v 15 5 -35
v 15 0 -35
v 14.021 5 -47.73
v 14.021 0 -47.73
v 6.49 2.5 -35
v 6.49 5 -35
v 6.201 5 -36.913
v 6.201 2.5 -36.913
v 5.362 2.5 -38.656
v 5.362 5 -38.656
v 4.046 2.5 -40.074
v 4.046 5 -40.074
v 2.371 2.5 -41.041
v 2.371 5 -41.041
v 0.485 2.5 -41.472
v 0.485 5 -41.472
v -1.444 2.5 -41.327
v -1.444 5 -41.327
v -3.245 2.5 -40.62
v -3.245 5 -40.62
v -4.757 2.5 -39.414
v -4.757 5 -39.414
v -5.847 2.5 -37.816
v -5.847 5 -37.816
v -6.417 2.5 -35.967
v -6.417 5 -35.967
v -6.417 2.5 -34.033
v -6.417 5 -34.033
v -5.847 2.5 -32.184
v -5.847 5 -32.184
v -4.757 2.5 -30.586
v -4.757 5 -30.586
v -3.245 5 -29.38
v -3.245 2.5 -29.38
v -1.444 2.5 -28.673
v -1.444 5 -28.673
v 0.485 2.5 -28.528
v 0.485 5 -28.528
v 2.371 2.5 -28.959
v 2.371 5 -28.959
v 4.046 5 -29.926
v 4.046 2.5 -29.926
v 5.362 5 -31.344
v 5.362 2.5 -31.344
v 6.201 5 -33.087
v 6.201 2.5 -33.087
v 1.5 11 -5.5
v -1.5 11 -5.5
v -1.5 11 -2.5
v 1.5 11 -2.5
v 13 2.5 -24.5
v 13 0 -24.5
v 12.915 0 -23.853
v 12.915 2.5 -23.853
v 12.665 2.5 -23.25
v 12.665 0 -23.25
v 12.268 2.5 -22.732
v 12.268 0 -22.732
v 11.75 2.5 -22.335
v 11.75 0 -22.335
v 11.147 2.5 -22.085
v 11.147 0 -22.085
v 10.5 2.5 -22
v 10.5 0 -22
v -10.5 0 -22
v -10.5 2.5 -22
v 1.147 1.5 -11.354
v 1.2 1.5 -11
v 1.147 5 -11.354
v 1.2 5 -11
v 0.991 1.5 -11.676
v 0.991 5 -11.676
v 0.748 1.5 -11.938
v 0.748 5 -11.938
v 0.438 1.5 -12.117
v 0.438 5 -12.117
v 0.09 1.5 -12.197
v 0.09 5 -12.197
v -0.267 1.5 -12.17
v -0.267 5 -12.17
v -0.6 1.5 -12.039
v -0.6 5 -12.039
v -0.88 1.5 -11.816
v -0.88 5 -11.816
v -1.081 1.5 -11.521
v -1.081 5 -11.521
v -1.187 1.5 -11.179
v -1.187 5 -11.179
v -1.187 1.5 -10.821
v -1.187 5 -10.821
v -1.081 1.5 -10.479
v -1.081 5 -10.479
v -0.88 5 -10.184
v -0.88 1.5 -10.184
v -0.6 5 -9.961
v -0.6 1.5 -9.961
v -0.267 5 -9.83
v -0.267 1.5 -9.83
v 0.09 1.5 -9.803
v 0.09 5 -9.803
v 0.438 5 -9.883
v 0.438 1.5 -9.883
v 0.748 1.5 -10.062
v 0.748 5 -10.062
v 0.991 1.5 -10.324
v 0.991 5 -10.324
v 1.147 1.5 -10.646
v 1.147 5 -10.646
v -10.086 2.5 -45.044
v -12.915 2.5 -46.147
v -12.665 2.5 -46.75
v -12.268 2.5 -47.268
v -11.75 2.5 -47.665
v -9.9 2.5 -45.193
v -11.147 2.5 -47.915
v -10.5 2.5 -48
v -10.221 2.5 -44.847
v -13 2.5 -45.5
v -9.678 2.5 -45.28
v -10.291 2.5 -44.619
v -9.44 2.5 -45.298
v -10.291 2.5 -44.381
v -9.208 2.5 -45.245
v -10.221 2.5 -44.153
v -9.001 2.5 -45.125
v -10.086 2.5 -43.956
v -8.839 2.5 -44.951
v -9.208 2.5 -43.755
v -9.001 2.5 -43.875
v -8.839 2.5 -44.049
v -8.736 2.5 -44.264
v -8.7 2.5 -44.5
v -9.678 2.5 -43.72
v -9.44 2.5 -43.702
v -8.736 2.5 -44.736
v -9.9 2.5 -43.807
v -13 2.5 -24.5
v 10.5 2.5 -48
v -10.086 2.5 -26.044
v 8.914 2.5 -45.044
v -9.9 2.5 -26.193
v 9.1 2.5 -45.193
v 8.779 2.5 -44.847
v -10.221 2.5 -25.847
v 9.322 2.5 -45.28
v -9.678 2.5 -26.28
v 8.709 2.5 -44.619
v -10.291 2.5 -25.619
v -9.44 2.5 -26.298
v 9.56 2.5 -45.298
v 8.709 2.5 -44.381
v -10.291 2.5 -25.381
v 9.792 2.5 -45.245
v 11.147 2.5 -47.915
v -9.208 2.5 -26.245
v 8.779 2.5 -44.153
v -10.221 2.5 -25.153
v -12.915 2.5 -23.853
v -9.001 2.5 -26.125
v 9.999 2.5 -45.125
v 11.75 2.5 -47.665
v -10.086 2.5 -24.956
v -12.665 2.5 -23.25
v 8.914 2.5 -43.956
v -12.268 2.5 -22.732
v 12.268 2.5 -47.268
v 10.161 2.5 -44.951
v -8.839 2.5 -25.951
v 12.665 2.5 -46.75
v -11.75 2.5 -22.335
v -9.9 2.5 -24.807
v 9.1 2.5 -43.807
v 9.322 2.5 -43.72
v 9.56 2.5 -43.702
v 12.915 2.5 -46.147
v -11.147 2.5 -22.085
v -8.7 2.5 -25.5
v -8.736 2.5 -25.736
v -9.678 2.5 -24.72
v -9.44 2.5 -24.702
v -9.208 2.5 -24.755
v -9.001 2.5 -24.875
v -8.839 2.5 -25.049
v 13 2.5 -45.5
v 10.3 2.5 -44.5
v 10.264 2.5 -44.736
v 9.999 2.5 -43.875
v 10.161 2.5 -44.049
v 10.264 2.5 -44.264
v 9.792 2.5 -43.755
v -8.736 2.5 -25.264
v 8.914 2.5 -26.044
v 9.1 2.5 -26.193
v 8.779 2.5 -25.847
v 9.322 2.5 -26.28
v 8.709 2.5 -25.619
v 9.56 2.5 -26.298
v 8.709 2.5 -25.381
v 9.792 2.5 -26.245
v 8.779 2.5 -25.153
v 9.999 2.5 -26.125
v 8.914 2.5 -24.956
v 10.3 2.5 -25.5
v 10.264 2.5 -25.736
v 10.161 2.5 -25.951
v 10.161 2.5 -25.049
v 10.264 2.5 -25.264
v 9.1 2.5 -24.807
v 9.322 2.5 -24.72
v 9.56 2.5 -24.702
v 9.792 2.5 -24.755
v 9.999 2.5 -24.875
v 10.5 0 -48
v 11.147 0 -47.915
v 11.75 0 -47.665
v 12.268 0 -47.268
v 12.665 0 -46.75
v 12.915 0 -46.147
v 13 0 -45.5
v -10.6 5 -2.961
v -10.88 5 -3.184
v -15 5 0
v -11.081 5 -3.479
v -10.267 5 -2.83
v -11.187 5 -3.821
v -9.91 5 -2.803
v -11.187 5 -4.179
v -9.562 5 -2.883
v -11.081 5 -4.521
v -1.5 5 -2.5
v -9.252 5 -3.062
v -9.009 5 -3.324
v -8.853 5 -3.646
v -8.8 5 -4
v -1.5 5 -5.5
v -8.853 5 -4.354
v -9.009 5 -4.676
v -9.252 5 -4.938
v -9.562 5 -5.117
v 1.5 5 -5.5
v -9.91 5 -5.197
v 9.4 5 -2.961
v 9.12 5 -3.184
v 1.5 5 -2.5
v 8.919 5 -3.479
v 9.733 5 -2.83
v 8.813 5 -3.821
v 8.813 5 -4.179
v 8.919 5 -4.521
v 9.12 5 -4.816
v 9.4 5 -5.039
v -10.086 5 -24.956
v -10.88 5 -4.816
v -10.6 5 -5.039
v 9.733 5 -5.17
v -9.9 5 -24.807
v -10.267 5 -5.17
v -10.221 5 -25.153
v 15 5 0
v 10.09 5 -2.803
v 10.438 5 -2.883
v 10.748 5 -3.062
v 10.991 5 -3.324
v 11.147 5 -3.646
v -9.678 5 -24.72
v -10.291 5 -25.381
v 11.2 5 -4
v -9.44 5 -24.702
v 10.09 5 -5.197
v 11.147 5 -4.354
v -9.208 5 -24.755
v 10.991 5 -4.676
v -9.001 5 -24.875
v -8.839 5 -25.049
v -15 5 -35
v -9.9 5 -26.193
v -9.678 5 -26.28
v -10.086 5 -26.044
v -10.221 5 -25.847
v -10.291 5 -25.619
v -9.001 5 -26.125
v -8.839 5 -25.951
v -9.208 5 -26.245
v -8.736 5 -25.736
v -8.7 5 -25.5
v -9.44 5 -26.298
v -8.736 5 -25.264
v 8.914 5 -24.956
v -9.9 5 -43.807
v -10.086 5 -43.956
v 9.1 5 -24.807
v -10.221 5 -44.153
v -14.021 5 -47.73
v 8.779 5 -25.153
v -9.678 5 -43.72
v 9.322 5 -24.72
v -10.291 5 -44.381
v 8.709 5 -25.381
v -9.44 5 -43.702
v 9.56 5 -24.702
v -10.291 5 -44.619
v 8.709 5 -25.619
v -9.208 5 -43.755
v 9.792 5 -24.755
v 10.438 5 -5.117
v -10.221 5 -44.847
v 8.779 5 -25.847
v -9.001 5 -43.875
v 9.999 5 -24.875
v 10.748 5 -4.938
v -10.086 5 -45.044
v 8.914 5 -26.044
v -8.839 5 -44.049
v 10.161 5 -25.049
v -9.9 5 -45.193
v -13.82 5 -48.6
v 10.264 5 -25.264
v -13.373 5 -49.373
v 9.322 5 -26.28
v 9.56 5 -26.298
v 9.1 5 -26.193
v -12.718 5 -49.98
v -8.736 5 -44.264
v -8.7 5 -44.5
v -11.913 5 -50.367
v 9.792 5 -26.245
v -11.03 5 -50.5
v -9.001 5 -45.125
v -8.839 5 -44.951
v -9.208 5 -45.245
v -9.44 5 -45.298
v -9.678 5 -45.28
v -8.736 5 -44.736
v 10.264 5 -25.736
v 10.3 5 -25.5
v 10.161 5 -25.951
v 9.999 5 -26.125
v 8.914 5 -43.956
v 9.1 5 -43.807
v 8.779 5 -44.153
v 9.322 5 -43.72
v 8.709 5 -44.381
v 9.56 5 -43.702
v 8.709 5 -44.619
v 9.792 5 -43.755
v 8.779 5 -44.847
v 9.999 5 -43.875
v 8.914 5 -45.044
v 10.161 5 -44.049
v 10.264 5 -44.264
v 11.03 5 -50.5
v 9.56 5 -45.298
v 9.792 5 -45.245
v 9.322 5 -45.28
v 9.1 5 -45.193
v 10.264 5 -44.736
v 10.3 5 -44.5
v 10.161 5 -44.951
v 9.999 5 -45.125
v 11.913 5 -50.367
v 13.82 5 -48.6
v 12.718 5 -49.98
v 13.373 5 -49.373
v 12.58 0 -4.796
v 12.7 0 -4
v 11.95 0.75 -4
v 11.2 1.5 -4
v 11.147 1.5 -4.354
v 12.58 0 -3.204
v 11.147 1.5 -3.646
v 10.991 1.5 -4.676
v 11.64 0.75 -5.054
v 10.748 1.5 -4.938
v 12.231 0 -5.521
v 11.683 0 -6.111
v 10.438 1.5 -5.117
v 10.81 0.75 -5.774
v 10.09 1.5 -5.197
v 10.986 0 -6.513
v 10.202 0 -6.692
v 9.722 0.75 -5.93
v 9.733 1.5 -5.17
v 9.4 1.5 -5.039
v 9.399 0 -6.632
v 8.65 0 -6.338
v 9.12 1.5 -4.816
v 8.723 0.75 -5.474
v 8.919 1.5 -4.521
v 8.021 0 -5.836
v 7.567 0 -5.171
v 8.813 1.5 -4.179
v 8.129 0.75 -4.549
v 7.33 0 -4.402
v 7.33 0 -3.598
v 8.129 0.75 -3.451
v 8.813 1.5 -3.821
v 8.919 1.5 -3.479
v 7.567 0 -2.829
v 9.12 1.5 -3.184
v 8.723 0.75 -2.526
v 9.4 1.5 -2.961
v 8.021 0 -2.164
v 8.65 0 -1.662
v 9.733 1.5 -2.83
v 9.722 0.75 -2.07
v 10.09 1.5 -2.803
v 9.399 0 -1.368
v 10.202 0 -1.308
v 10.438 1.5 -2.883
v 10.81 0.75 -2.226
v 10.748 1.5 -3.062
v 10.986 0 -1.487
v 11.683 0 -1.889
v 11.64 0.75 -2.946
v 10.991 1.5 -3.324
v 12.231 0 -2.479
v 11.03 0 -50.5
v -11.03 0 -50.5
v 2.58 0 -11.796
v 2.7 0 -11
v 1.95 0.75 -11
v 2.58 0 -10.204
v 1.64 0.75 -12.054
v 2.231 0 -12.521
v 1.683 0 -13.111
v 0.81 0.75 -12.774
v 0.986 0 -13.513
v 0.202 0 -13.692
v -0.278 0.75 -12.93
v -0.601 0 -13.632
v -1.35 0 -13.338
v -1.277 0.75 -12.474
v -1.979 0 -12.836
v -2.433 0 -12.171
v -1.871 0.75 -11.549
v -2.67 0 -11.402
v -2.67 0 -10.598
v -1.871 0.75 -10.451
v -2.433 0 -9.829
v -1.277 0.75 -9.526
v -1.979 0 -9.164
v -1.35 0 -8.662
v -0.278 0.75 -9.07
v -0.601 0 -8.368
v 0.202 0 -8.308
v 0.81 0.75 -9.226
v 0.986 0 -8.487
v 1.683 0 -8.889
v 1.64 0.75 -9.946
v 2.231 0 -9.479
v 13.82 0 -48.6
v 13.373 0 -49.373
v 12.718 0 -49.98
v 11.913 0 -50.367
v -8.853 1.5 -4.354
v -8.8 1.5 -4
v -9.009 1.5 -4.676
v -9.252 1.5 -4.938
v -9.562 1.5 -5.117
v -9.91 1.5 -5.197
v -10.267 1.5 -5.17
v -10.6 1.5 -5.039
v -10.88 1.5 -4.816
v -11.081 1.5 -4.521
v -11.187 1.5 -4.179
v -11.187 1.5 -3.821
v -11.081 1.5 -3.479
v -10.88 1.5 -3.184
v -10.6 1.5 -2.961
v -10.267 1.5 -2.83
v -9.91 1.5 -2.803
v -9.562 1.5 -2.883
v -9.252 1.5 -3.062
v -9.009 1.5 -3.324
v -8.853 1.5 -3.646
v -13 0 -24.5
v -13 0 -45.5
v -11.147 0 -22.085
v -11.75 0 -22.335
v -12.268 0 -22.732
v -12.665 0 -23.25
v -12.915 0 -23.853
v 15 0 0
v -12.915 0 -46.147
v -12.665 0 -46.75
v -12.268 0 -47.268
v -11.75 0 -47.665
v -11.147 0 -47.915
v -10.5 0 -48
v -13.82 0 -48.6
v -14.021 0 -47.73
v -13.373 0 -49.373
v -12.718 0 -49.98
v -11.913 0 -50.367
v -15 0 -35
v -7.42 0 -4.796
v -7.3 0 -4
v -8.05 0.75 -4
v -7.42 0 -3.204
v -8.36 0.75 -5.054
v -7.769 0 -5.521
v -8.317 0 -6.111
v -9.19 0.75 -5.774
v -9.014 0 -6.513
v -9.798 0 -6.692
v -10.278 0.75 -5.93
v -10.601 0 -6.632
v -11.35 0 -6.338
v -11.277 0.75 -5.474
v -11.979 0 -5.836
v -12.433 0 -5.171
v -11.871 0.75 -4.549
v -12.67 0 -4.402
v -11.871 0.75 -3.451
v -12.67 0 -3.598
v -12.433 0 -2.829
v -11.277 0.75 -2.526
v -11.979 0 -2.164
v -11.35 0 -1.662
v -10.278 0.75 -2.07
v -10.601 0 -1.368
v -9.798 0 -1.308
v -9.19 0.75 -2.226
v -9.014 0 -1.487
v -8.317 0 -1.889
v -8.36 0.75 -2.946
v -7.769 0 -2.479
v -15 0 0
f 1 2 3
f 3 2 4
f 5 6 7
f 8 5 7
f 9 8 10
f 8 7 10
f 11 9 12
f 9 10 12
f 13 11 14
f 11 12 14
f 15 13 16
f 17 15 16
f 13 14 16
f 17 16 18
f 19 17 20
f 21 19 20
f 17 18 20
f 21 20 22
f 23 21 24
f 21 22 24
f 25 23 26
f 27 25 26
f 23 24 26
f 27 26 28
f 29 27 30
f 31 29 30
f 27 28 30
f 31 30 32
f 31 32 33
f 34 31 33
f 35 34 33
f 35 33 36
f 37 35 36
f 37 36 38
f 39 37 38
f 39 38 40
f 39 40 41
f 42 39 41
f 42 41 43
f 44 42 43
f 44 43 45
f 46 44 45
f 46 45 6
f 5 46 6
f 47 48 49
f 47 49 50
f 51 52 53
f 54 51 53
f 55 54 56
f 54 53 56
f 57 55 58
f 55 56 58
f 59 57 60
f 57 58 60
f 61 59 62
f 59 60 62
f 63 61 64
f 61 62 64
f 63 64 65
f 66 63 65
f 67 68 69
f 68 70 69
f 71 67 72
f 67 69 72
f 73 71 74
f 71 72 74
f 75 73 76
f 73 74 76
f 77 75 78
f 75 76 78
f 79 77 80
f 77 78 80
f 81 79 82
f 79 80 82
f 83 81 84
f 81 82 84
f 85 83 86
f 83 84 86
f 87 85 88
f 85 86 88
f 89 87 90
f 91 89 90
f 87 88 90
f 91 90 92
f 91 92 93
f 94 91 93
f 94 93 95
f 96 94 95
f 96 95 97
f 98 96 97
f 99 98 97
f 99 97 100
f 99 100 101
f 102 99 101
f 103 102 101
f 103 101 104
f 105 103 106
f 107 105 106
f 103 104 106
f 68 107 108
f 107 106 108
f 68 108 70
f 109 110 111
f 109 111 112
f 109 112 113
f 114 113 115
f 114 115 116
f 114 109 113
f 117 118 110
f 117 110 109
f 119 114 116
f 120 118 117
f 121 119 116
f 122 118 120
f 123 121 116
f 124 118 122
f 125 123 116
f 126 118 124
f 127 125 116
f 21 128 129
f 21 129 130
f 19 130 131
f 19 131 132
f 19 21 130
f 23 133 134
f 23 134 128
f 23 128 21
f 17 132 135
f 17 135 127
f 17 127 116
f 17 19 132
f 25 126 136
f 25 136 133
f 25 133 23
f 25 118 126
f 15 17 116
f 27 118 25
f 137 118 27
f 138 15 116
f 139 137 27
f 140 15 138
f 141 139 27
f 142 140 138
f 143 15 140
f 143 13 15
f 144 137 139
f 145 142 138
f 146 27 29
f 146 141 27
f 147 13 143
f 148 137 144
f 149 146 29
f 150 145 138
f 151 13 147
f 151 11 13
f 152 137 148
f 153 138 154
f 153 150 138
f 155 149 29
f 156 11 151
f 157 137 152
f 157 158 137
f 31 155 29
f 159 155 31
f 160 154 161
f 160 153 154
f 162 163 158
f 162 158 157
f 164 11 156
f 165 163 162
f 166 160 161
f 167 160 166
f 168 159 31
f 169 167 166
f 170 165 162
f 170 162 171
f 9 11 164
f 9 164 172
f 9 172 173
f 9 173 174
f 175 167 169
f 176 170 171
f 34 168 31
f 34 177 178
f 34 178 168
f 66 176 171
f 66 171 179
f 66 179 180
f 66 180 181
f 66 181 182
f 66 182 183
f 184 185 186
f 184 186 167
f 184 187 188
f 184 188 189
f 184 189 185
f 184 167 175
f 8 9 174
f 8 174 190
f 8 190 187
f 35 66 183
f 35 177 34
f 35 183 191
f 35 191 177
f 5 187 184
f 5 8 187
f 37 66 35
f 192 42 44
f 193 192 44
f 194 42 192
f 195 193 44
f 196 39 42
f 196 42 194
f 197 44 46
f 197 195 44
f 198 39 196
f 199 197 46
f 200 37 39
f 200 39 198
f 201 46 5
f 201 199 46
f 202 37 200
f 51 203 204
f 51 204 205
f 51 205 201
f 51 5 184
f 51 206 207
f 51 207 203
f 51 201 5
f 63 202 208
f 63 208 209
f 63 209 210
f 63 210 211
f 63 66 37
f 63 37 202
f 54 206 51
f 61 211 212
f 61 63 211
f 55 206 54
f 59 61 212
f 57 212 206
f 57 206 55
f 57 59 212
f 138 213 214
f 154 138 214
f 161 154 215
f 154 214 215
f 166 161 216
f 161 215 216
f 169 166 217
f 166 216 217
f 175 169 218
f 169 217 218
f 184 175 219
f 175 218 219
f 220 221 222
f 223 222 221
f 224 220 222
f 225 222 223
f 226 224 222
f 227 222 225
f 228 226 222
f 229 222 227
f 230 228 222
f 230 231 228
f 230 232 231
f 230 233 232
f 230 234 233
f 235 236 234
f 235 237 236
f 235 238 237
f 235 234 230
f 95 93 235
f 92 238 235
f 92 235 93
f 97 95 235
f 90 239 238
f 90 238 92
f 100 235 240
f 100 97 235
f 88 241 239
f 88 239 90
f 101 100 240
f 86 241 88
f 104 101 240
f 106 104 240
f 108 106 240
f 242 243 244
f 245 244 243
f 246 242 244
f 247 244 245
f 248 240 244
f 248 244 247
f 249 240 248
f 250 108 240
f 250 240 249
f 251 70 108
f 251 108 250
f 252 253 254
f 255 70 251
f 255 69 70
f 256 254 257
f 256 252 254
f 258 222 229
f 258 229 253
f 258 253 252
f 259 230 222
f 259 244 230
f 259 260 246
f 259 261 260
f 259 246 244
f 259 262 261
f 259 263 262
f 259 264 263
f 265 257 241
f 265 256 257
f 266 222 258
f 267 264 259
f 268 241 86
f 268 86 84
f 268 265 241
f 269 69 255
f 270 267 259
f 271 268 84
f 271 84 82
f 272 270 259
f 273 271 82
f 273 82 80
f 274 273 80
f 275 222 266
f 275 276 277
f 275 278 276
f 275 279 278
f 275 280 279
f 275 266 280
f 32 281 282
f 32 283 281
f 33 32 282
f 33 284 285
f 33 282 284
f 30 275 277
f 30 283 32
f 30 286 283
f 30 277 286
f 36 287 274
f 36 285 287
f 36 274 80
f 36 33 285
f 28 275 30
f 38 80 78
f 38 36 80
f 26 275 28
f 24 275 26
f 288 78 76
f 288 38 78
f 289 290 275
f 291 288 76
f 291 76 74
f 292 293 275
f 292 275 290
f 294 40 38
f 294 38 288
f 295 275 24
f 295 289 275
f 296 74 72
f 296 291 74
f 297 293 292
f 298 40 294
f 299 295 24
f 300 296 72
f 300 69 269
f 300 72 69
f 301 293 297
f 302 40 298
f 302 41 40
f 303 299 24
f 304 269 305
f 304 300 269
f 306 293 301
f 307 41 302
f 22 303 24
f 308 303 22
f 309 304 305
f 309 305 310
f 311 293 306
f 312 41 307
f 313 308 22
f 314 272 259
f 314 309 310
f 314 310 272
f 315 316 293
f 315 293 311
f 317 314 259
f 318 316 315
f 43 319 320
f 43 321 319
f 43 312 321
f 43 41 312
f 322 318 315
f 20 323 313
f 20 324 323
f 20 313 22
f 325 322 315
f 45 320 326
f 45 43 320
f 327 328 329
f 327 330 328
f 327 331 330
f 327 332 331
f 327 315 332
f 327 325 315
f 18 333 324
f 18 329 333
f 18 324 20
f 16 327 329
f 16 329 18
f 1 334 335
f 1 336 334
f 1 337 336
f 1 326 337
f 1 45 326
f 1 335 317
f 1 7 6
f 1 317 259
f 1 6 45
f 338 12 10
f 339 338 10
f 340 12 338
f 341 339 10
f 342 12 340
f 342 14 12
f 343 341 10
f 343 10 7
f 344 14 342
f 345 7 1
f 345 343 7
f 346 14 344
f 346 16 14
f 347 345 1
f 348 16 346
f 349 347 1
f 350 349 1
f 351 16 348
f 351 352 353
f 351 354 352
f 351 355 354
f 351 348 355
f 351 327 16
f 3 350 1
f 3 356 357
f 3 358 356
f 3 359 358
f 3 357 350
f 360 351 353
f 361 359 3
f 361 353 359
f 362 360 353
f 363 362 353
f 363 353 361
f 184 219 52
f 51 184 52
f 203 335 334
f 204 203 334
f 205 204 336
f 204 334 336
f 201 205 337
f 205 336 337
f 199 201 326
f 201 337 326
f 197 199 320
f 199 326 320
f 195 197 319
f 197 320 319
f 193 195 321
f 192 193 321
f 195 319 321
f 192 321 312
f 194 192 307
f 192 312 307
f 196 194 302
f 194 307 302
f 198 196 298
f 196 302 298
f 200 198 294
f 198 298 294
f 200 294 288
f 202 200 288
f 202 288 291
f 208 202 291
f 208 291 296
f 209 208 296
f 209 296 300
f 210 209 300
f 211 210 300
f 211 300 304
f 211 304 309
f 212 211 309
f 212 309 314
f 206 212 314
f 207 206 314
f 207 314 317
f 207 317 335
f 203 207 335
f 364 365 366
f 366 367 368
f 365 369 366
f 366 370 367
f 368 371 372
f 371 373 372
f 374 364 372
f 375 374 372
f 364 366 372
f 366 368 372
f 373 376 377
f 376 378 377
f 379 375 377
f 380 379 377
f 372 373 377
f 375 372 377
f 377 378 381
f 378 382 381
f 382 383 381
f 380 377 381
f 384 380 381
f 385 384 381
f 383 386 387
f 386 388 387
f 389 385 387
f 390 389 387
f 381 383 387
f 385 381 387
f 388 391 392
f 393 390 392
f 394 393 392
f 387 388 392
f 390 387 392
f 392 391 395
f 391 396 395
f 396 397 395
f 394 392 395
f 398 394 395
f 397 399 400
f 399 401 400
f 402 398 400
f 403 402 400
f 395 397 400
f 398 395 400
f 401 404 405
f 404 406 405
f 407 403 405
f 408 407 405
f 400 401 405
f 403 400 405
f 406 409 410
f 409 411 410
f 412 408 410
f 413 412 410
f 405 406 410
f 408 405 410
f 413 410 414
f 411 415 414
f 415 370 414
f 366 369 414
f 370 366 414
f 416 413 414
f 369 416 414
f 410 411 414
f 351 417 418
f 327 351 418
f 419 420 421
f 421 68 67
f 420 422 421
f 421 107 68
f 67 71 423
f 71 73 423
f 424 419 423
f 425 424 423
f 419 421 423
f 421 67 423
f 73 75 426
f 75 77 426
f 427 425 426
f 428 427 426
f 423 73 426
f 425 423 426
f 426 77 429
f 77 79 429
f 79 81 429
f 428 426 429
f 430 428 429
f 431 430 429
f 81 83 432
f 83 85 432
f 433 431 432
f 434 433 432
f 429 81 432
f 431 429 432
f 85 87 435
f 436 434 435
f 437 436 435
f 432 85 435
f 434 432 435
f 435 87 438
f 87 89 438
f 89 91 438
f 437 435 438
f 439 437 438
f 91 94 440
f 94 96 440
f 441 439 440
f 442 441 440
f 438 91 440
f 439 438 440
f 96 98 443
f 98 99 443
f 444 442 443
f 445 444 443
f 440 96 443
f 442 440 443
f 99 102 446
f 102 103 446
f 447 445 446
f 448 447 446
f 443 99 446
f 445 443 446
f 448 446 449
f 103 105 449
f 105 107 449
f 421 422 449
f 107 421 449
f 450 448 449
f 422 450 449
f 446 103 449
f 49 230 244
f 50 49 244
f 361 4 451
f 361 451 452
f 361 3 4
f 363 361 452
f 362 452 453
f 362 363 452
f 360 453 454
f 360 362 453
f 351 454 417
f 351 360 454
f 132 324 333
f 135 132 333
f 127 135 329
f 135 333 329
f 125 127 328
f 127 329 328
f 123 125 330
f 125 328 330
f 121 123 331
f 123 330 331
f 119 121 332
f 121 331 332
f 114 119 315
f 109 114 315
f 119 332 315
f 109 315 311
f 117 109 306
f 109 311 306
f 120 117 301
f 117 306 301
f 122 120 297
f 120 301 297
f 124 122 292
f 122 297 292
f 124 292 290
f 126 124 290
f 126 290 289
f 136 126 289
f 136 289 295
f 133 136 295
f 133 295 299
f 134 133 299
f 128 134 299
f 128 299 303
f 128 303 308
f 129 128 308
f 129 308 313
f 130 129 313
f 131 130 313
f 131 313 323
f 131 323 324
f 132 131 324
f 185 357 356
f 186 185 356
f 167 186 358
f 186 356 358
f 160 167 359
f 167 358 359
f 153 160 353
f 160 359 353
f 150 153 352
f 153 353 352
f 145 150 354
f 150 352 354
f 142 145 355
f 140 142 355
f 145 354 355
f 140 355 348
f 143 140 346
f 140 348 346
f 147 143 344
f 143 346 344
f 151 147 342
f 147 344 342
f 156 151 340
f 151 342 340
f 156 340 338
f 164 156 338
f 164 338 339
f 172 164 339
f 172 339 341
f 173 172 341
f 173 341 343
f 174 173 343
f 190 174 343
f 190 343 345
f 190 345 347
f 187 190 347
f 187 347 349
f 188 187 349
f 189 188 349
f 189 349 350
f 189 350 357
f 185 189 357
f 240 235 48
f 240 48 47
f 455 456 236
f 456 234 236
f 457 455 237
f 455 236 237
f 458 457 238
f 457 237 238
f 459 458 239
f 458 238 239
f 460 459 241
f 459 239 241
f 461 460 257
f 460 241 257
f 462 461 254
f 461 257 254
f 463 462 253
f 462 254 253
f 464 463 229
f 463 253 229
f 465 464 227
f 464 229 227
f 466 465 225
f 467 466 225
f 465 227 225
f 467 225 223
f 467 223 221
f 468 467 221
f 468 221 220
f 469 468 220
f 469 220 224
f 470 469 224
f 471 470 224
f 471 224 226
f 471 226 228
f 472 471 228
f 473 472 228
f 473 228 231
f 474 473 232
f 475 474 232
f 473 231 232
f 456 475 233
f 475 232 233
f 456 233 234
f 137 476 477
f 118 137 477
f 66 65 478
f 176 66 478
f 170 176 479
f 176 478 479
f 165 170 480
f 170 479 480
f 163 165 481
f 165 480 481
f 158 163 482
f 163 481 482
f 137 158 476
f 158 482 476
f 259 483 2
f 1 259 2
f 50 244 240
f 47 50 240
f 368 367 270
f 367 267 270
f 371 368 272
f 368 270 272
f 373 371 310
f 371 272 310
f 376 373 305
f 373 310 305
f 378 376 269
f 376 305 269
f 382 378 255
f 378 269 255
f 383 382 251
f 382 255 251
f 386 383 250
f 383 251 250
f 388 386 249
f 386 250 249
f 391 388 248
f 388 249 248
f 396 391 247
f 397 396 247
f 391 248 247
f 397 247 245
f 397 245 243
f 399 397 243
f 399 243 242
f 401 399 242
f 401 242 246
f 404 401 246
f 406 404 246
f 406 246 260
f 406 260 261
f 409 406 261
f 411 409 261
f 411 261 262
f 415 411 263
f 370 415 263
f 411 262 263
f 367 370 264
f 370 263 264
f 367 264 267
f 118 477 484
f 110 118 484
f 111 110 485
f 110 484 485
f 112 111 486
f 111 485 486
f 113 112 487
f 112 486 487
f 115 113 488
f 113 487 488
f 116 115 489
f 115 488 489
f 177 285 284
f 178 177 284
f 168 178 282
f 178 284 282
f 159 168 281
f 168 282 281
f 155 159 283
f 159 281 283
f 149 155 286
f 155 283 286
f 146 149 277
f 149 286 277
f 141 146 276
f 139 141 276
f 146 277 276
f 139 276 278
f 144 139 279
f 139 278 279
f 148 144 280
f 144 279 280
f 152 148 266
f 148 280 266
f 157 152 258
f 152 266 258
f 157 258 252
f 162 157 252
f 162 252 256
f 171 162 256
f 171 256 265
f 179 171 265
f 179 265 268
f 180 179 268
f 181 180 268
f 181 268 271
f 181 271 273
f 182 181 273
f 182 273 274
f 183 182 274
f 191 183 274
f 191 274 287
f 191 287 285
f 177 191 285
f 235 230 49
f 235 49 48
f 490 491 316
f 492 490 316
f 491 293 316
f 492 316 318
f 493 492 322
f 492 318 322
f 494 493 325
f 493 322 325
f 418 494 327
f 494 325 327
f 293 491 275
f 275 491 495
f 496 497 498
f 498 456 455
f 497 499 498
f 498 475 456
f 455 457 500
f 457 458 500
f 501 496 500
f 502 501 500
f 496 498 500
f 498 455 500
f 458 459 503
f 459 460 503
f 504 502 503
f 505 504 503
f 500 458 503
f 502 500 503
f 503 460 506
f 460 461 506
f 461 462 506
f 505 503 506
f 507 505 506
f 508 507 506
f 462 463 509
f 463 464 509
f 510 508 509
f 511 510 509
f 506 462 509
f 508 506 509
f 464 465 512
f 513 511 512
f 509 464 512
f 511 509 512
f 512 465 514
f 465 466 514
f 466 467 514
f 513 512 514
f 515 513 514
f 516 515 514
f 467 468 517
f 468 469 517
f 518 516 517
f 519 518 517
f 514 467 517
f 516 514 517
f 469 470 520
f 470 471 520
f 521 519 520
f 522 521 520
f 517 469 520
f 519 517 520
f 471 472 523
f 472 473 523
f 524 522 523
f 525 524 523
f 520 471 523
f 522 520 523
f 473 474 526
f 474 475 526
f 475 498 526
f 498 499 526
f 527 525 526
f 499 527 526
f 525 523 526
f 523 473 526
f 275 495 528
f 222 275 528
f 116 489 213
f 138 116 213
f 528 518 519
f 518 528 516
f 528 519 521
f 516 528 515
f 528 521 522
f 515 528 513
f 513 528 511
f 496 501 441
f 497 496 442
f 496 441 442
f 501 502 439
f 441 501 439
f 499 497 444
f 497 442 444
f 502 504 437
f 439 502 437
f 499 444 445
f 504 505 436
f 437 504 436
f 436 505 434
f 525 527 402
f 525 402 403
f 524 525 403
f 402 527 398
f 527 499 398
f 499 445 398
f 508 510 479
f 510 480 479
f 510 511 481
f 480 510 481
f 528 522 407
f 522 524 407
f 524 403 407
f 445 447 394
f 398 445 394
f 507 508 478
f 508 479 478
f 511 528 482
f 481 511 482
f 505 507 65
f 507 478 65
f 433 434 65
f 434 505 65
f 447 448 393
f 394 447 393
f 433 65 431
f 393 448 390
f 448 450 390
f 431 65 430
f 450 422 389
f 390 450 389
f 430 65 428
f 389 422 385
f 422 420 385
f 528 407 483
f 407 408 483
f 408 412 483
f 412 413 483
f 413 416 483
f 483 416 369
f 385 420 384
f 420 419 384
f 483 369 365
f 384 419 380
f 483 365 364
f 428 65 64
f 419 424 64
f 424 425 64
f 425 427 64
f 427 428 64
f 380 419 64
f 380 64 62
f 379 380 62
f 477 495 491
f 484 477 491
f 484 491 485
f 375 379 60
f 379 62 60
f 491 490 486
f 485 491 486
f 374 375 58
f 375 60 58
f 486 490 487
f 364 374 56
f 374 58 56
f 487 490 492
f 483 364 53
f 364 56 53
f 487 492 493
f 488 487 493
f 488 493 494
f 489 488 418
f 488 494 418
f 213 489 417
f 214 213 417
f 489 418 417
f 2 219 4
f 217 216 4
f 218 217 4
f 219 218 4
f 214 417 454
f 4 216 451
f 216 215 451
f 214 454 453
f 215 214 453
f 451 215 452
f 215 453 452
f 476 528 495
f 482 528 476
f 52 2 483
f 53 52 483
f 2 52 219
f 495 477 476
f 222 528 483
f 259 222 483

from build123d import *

# Parameters (mm, degrees)
BOSS_EXTRUDE1_DEPTH                                 = 5
CUT_EXTRUDE1_REACH                                  = 7
SKETCH2_R                                           = 6.4897
SKETCH3_W                                           = 3
SKETCH3_H                                           = 3
BOSS_EXTRUDE2_DEPTH                                 = 6
CSK_FOR_M2_COUNTERSUNK_FLAT_HEAD_SCREW1_D           = 2.4
CSK_FOR_M2_COUNTERSUNK_FLAT_HEAD_SCREW1_DEPTH       = 5.2
CSK_FOR_M2_COUNTERSUNK_FLAT_HEAD_SCREW1_CSINK_D     = 5.4
CSK_FOR_M2_COUNTERSUNK_FLAT_HEAD_SCREW1_CSINK_ANGLE = 90
CSK_FOR_M2_COUNTERSUNK_FLAT_HEAD_SCREW1_TIP         = 0.721032743
CUT_EXTRUDE2_DEPTH                                  = 2.5
FILLET1_R                                           = 3
M2_TAPPED_HOLE1_D                                   = 1.6
M2_TAPPED_HOLE1_DEPTH                               = 2.5


with BuildPart() as part:
    # Sketch1 → Boss-Extrude1 (new body)
    with BuildSketch(Plane(origin=(0, 0, 0), x_dir=(1, 0, 0), z_dir=(0, 1, 0))):
        Polygon((-15, 0), (15, 0), (15, 35), (13.807692308, 50.5), (-13.807692308, 50.5), (-15, 35), align=None)
    extrude(amount=BOSS_EXTRUDE1_DEPTH)

    # Sketch2 → Cut-Extrude1 (cut, up to next)
    with BuildSketch(Plane(origin=(0, 5, 0), x_dir=(1, 0, 0), z_dir=(0, 1, 0)), mode=Mode.PRIVATE) as cut_extrude1_sk1:
        with Locations((0, 35)):
            Circle(SKETCH2_R)
    cut_extrude1_tool1 = extrude(cut_extrude1_sk1.sketch, amount=-CUT_EXTRUDE1_REACH, mode=Mode.PRIVATE) & part.part
    add(cut_extrude1_tool1.solids().sort_by_distance((0, 5, -35))[0], mode=Mode.SUBTRACT)

    # Sketch3 → Boss-Extrude2 (add)
    with BuildSketch(Plane(origin=(0, 5, 0), x_dir=(1, 0, 0), z_dir=(0, 1, 0))):
        with Locations((0, 4)):
            Rectangle(SKETCH3_W, SKETCH3_H)
    extrude(amount=BOSS_EXTRUDE2_DEPTH)

    # CSK for M2 Countersunk Flat Head Screw1
    with Locations(Plane(origin=(0, 0, 0), x_dir=(-1, 0, 0), z_dir=(0, -1, 0))):
        with Locations((-10, 4), (10, 4), (0, 11)):
            CounterSinkHole(CSK_FOR_M2_COUNTERSUNK_FLAT_HEAD_SCREW1_D / 2, CSK_FOR_M2_COUNTERSUNK_FLAT_HEAD_SCREW1_CSINK_D / 2, depth=CSK_FOR_M2_COUNTERSUNK_FLAT_HEAD_SCREW1_DEPTH, counter_sink_angle=CSK_FOR_M2_COUNTERSUNK_FLAT_HEAD_SCREW1_CSINK_ANGLE)
            with Locations((0, 0, -(CSK_FOR_M2_COUNTERSUNK_FLAT_HEAD_SCREW1_DEPTH + CSK_FOR_M2_COUNTERSUNK_FLAT_HEAD_SCREW1_TIP / 2))):  # 118° drill point
                Cone(0, CSK_FOR_M2_COUNTERSUNK_FLAT_HEAD_SCREW1_D / 2, CSK_FOR_M2_COUNTERSUNK_FLAT_HEAD_SCREW1_TIP, mode=Mode.SUBTRACT)

    # Sketch6 → Cut-Extrude2 (cut)
    with BuildSketch(Plane.XZ):
        with BuildLine():
            Line((-10.5, -48), (10.5, -48))
            ThreePointArc((10.5, -48), (12.267766953, -47.267766953), (13, -45.5))
            Line((13, -45.5), (13, -24.5))
            ThreePointArc((13, -24.5), (12.267766953, -22.732233047), (10.5, -22))
            Line((10.5, -22), (-10.5, -22))
            ThreePointArc((-10.5, -22), (-12.267766953, -22.732233047), (-13, -24.5))
            Line((-13, -24.5), (-13, -45.5))
            ThreePointArc((-13, -45.5), (-12.267766953, -47.267766953), (-10.5, -48))
        make_face()
    extrude(amount=-CUT_EXTRUDE2_DEPTH, mode=Mode.SUBTRACT)

    # Fillet1
    fillet1_edges = [part.edges().sort_by_distance(p)[0] for p in [
        (-13.807692308, 2.5, -50.5),
        (13.807692308, 2.5, -50.5),
    ]]
    fillet(fillet1_edges, radius=FILLET1_R)

    # M2 Tapped Hole1
    with Locations(Plane(origin=(0, 2.5, 0), x_dir=(-1, 0, 0), z_dir=(0, -1, 0))):
        with Locations((9.5, 25.5), (9.5, 44.5), (-9.5, 44.5), (-9.5, 25.5)):
            Hole(M2_TAPPED_HOLE1_D / 2, depth=M2_TAPPED_HOLE1_DEPTH)


solid = part.part
